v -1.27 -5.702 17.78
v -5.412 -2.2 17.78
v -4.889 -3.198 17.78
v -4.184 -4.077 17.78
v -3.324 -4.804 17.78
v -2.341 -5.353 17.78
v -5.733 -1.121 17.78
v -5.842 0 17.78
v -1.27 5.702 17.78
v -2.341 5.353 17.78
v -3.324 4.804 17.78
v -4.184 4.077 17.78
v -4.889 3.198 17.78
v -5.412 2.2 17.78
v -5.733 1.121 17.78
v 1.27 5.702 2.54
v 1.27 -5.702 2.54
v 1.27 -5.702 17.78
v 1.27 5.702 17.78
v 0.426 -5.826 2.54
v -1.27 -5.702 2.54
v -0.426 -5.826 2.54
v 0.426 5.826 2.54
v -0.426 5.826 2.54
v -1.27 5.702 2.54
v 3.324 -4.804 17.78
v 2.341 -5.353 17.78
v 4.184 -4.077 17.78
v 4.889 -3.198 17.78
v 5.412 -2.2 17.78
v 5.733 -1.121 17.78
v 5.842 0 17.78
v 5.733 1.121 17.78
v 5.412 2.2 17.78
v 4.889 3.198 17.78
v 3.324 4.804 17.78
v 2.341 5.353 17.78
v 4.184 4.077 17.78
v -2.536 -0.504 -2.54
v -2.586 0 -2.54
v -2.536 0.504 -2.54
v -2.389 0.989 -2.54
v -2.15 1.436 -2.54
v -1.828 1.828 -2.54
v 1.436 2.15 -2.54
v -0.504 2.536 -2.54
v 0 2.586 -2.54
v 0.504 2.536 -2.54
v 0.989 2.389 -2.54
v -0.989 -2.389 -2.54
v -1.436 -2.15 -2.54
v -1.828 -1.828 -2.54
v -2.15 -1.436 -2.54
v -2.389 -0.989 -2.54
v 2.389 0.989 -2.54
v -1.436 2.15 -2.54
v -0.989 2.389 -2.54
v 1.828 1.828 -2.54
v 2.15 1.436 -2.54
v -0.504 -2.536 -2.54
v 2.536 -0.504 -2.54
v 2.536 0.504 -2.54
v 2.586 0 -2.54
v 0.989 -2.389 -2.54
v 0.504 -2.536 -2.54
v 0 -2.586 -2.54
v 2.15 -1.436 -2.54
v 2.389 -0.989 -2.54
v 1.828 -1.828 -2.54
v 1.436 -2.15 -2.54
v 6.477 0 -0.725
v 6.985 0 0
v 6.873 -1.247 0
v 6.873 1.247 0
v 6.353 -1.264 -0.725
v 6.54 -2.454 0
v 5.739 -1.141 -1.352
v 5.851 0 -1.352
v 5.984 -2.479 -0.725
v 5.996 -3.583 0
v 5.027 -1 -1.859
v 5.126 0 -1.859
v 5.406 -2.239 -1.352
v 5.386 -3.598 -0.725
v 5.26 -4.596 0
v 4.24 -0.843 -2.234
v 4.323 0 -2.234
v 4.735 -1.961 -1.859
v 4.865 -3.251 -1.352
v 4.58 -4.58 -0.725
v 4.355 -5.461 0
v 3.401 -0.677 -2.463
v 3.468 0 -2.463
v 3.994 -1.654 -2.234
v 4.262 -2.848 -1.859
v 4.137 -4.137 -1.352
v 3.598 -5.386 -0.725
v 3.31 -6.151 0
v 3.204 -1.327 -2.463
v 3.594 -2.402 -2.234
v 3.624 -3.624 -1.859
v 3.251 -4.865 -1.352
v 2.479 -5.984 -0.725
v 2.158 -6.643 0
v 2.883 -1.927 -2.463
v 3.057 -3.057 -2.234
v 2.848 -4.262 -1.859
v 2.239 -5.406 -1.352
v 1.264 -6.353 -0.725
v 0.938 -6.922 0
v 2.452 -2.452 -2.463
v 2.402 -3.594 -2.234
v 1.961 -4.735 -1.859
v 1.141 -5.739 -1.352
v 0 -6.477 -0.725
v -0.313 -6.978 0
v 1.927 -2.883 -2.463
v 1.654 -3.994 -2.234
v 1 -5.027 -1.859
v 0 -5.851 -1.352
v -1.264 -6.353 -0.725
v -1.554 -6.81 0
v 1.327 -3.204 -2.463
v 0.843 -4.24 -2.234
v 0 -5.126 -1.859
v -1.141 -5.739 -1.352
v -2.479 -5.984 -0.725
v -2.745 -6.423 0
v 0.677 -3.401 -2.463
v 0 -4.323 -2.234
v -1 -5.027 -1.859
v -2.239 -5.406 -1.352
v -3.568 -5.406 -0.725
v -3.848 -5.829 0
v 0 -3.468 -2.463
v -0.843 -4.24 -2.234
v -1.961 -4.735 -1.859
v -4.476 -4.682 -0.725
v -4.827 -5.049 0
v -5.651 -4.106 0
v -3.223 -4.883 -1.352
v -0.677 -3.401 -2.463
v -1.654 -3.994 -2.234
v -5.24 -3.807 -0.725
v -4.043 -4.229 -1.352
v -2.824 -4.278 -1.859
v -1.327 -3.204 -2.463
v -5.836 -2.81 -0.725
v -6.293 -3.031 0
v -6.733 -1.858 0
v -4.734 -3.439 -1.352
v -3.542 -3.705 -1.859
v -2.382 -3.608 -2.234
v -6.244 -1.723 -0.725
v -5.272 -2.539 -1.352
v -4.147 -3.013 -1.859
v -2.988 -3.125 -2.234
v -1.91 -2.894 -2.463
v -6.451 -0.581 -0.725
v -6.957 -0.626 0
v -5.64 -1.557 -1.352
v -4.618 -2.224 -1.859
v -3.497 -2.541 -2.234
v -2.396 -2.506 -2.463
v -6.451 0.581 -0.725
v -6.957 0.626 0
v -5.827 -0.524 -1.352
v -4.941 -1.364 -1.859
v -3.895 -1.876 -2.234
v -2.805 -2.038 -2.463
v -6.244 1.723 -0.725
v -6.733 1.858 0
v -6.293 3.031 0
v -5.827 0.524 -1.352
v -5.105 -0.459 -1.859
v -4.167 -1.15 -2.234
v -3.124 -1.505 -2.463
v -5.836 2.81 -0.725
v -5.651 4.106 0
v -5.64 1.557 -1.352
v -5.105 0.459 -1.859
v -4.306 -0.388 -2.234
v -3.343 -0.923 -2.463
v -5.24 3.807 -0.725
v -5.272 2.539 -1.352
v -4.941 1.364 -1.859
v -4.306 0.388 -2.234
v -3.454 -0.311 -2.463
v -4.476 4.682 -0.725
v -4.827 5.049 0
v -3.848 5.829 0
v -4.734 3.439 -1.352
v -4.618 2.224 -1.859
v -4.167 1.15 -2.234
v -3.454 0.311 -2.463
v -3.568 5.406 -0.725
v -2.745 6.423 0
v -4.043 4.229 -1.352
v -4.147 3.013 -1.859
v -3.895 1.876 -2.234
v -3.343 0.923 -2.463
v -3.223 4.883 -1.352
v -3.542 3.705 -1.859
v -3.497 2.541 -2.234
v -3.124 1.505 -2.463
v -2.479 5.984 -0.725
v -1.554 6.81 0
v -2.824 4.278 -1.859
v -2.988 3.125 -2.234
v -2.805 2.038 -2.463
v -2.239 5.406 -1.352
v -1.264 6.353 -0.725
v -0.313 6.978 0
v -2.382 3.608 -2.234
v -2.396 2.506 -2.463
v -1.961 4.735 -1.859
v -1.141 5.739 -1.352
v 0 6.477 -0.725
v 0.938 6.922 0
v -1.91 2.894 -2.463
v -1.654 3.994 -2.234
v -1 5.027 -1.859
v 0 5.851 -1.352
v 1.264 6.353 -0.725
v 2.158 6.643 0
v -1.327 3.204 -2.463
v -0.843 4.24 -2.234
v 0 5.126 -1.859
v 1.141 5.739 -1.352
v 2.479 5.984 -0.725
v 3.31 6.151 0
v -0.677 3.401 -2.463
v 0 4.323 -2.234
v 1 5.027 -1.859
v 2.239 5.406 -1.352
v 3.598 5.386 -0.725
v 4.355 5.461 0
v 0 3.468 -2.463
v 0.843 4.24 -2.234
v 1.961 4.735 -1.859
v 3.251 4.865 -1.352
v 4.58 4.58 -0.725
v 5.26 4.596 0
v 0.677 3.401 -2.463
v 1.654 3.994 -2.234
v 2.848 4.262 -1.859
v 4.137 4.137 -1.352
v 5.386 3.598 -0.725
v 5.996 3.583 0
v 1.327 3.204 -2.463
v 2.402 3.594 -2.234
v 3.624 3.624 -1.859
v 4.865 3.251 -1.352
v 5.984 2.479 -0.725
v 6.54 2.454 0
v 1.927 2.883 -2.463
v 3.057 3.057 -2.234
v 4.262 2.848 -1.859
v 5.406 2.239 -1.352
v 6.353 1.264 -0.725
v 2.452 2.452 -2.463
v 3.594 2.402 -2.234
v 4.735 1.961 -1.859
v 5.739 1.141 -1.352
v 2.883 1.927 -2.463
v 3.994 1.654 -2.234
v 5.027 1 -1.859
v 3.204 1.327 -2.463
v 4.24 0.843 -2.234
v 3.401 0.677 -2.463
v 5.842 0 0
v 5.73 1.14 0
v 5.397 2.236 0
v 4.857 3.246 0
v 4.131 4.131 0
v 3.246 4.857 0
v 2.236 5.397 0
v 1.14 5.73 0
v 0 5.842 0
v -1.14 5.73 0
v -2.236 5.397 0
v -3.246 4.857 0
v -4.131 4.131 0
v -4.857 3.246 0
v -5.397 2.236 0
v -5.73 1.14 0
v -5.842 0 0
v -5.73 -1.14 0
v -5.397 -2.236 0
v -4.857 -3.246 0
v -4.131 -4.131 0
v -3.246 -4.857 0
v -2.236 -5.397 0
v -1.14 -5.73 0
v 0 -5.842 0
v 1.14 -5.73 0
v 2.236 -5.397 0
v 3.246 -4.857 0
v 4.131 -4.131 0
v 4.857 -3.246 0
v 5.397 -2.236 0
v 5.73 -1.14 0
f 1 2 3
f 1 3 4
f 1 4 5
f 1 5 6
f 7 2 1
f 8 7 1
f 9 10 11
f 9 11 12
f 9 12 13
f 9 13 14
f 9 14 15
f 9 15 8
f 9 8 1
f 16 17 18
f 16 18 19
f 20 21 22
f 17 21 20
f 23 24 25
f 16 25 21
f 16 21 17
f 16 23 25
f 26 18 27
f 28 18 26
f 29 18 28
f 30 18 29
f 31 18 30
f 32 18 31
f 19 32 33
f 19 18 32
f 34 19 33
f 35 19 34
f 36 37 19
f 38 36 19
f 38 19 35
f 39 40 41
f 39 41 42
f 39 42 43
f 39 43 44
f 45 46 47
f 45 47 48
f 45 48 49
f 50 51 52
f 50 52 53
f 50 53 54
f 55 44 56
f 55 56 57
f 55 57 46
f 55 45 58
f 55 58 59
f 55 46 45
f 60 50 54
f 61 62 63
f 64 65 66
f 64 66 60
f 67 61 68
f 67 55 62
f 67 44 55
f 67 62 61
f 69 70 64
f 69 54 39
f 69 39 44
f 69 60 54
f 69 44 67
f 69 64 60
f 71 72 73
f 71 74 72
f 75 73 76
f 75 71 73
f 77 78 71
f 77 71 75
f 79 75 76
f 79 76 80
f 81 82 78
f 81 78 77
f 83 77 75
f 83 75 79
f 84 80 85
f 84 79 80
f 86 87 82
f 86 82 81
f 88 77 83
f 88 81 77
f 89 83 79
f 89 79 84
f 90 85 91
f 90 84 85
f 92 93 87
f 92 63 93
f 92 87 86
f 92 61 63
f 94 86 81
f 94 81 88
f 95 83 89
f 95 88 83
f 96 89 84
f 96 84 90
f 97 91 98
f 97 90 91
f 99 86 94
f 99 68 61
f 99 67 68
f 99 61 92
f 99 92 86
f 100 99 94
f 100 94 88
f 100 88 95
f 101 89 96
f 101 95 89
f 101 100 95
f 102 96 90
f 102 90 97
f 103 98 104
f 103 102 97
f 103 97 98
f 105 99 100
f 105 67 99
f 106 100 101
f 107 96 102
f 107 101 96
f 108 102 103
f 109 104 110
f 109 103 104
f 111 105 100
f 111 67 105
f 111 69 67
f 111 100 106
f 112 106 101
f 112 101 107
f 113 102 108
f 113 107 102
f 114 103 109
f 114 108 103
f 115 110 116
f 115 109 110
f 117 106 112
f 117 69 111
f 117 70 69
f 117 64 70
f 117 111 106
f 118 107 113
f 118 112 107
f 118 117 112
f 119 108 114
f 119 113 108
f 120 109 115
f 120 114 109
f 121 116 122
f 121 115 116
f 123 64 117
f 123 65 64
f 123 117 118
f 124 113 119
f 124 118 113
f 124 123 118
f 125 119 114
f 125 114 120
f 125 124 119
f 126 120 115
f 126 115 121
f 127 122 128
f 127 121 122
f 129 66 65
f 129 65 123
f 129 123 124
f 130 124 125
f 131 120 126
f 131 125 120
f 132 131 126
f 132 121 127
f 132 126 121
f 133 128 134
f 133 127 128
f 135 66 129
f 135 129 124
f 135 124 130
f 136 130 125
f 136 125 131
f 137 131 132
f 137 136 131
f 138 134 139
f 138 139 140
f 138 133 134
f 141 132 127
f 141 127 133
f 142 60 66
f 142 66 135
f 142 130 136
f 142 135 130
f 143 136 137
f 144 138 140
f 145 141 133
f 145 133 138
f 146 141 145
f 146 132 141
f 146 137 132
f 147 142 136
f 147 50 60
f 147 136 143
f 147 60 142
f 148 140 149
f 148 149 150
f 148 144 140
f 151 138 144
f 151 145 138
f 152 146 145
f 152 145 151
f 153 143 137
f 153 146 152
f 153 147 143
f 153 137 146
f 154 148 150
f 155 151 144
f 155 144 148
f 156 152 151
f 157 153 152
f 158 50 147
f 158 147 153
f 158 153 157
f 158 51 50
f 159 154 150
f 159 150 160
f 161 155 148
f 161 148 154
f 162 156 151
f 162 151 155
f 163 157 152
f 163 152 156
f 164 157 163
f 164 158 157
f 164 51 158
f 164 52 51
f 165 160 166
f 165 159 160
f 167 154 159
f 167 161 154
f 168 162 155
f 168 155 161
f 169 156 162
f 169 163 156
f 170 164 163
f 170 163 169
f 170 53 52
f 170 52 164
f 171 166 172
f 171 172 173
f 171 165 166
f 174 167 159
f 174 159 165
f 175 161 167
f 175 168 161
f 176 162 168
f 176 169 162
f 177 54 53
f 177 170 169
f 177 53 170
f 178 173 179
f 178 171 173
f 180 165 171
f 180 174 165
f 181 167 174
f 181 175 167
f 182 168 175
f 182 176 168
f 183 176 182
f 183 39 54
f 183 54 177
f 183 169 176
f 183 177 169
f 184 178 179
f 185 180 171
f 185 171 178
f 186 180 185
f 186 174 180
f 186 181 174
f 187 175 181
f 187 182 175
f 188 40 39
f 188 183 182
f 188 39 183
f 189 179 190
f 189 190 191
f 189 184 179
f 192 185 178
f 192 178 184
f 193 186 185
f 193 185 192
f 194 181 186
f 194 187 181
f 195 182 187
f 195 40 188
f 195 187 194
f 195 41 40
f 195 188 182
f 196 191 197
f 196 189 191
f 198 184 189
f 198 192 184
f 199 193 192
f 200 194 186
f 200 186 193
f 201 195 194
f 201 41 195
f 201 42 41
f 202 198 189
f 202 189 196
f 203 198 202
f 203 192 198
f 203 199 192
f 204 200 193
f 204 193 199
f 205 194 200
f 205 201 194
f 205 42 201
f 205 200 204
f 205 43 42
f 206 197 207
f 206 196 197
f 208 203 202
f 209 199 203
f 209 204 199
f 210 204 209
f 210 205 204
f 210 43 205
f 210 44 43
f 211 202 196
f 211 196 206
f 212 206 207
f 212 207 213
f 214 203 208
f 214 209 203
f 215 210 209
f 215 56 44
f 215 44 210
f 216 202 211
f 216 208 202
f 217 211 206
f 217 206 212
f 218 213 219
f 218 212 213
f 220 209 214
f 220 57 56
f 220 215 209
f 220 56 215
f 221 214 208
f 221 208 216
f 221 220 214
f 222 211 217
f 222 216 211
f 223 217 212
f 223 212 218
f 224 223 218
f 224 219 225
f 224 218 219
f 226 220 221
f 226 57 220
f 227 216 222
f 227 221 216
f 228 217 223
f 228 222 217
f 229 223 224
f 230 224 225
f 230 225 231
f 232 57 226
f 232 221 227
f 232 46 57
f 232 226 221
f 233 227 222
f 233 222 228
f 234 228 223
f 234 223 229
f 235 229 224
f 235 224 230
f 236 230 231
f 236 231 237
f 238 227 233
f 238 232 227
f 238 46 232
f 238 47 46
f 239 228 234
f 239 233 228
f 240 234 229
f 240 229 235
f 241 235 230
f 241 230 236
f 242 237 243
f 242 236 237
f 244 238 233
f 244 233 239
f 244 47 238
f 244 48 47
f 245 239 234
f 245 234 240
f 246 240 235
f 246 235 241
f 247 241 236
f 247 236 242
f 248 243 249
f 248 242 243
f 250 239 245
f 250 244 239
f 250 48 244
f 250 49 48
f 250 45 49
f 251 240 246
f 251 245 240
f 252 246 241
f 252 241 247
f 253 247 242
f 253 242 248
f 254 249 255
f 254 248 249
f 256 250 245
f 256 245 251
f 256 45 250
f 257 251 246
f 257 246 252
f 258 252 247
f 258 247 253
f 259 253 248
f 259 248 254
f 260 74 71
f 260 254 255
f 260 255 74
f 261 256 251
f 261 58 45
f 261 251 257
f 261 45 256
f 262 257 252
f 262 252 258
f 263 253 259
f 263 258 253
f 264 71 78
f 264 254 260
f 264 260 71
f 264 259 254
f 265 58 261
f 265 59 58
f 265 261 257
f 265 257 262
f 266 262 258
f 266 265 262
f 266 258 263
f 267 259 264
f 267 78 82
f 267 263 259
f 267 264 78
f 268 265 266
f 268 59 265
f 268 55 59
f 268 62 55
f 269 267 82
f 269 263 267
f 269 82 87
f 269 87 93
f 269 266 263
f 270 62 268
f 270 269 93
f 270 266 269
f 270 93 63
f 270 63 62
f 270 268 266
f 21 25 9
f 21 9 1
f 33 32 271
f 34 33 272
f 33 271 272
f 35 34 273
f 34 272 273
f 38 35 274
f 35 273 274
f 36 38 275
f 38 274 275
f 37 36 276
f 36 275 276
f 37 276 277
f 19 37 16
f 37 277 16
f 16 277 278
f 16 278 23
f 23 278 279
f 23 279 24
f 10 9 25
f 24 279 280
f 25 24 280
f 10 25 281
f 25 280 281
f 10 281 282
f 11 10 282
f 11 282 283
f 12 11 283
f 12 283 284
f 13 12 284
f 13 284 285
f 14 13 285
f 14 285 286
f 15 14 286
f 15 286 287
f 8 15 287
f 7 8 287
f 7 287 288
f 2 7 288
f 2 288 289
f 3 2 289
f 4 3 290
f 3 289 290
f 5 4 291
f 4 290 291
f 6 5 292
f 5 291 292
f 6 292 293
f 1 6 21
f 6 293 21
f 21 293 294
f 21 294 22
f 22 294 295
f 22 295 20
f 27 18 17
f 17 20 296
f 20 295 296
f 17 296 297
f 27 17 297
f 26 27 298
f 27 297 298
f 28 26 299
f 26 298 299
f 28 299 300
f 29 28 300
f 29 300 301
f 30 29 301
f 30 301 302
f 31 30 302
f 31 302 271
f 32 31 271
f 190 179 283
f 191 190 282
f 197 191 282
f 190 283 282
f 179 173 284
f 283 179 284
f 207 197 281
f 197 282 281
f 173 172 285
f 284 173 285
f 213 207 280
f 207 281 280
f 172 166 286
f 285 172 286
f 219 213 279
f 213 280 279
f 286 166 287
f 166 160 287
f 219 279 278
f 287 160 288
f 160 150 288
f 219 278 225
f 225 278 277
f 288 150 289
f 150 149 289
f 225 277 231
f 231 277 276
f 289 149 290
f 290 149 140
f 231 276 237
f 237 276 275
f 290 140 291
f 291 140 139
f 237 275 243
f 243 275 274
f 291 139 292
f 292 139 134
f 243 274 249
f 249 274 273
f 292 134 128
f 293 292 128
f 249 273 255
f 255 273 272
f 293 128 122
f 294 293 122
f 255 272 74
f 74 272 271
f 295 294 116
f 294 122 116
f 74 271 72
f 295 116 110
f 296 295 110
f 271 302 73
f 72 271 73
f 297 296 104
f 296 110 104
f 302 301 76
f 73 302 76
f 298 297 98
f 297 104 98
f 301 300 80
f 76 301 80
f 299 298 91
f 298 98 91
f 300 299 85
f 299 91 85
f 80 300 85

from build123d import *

# Parameters (mm, degrees)
F0_R     = 5.842
F1_DEPTH = 17.78
F3_DEPTH = 15.24
F4_R     = 6.985
F4_R_2   = 5.842
F5_DEPTH = 2.54


# Not quite as in the source:
# - a fillet or chamfer that OpenCascade refuses, or shapes differently, is made with other operations: its cross-section is extruded or revolved along the edge and cut away or added


with BuildPart() as f1:
    # F0 (on Top) → F1 (new body)
    with BuildSketch(Plane.XY):
        Circle(F0_R)
    extrude(amount=F1_DEPTH)

    # F2 (on face) → F3 (cut)
    with BuildSketch(Plane.XY.offset(17.78)):
        with BuildLine():
            Line((1.27, -5.7022858574), (1.27, 5.7022858574))
            ThreePointArc((1.27, 5.7022858574), (0, 5.842), (-1.27, 5.7022858574))
            Line((-1.27, 5.7022858574), (-1.27, -5.7022858574))
            ThreePointArc((-1.27, -5.7022858574), (0, -5.842), (1.27, -5.7022858574))
        make_face()
    extrude(amount=-F3_DEPTH, mode=Mode.SUBTRACT)

    # F4 (on face) → F5 (join)
    with BuildSketch(Plane(origin=(0, 0, 0), x_dir=(1, 0, 0), z_dir=(0, 0, -1))):
        Circle(F4_R)
        Circle(F4_R_2, mode=Mode.SUBTRACT)
        Circle(F4_R_2)
    extrude(amount=F5_DEPTH)

    # F6: fillet of radius 5.08 on 1 edges, made by hand

    # F6_s1 → F6_t2 (revolve, cut)
    with BuildSketch(Plane.XZ):
        with BuildLine():
            ThreePointArc((6.985, 0), (5.1255909488, -1.8594090512), (2.5855909488, -2.54))
            Line((2.5855909488, -2.54), (6.985, -2.54))
            Line((6.985, -2.54), (6.985, 0))
        make_face()
    revolve(axis=Axis((0, 0, -2.54), (0, 0, -1)), mode=Mode.SUBTRACT)


solid = f1.part
